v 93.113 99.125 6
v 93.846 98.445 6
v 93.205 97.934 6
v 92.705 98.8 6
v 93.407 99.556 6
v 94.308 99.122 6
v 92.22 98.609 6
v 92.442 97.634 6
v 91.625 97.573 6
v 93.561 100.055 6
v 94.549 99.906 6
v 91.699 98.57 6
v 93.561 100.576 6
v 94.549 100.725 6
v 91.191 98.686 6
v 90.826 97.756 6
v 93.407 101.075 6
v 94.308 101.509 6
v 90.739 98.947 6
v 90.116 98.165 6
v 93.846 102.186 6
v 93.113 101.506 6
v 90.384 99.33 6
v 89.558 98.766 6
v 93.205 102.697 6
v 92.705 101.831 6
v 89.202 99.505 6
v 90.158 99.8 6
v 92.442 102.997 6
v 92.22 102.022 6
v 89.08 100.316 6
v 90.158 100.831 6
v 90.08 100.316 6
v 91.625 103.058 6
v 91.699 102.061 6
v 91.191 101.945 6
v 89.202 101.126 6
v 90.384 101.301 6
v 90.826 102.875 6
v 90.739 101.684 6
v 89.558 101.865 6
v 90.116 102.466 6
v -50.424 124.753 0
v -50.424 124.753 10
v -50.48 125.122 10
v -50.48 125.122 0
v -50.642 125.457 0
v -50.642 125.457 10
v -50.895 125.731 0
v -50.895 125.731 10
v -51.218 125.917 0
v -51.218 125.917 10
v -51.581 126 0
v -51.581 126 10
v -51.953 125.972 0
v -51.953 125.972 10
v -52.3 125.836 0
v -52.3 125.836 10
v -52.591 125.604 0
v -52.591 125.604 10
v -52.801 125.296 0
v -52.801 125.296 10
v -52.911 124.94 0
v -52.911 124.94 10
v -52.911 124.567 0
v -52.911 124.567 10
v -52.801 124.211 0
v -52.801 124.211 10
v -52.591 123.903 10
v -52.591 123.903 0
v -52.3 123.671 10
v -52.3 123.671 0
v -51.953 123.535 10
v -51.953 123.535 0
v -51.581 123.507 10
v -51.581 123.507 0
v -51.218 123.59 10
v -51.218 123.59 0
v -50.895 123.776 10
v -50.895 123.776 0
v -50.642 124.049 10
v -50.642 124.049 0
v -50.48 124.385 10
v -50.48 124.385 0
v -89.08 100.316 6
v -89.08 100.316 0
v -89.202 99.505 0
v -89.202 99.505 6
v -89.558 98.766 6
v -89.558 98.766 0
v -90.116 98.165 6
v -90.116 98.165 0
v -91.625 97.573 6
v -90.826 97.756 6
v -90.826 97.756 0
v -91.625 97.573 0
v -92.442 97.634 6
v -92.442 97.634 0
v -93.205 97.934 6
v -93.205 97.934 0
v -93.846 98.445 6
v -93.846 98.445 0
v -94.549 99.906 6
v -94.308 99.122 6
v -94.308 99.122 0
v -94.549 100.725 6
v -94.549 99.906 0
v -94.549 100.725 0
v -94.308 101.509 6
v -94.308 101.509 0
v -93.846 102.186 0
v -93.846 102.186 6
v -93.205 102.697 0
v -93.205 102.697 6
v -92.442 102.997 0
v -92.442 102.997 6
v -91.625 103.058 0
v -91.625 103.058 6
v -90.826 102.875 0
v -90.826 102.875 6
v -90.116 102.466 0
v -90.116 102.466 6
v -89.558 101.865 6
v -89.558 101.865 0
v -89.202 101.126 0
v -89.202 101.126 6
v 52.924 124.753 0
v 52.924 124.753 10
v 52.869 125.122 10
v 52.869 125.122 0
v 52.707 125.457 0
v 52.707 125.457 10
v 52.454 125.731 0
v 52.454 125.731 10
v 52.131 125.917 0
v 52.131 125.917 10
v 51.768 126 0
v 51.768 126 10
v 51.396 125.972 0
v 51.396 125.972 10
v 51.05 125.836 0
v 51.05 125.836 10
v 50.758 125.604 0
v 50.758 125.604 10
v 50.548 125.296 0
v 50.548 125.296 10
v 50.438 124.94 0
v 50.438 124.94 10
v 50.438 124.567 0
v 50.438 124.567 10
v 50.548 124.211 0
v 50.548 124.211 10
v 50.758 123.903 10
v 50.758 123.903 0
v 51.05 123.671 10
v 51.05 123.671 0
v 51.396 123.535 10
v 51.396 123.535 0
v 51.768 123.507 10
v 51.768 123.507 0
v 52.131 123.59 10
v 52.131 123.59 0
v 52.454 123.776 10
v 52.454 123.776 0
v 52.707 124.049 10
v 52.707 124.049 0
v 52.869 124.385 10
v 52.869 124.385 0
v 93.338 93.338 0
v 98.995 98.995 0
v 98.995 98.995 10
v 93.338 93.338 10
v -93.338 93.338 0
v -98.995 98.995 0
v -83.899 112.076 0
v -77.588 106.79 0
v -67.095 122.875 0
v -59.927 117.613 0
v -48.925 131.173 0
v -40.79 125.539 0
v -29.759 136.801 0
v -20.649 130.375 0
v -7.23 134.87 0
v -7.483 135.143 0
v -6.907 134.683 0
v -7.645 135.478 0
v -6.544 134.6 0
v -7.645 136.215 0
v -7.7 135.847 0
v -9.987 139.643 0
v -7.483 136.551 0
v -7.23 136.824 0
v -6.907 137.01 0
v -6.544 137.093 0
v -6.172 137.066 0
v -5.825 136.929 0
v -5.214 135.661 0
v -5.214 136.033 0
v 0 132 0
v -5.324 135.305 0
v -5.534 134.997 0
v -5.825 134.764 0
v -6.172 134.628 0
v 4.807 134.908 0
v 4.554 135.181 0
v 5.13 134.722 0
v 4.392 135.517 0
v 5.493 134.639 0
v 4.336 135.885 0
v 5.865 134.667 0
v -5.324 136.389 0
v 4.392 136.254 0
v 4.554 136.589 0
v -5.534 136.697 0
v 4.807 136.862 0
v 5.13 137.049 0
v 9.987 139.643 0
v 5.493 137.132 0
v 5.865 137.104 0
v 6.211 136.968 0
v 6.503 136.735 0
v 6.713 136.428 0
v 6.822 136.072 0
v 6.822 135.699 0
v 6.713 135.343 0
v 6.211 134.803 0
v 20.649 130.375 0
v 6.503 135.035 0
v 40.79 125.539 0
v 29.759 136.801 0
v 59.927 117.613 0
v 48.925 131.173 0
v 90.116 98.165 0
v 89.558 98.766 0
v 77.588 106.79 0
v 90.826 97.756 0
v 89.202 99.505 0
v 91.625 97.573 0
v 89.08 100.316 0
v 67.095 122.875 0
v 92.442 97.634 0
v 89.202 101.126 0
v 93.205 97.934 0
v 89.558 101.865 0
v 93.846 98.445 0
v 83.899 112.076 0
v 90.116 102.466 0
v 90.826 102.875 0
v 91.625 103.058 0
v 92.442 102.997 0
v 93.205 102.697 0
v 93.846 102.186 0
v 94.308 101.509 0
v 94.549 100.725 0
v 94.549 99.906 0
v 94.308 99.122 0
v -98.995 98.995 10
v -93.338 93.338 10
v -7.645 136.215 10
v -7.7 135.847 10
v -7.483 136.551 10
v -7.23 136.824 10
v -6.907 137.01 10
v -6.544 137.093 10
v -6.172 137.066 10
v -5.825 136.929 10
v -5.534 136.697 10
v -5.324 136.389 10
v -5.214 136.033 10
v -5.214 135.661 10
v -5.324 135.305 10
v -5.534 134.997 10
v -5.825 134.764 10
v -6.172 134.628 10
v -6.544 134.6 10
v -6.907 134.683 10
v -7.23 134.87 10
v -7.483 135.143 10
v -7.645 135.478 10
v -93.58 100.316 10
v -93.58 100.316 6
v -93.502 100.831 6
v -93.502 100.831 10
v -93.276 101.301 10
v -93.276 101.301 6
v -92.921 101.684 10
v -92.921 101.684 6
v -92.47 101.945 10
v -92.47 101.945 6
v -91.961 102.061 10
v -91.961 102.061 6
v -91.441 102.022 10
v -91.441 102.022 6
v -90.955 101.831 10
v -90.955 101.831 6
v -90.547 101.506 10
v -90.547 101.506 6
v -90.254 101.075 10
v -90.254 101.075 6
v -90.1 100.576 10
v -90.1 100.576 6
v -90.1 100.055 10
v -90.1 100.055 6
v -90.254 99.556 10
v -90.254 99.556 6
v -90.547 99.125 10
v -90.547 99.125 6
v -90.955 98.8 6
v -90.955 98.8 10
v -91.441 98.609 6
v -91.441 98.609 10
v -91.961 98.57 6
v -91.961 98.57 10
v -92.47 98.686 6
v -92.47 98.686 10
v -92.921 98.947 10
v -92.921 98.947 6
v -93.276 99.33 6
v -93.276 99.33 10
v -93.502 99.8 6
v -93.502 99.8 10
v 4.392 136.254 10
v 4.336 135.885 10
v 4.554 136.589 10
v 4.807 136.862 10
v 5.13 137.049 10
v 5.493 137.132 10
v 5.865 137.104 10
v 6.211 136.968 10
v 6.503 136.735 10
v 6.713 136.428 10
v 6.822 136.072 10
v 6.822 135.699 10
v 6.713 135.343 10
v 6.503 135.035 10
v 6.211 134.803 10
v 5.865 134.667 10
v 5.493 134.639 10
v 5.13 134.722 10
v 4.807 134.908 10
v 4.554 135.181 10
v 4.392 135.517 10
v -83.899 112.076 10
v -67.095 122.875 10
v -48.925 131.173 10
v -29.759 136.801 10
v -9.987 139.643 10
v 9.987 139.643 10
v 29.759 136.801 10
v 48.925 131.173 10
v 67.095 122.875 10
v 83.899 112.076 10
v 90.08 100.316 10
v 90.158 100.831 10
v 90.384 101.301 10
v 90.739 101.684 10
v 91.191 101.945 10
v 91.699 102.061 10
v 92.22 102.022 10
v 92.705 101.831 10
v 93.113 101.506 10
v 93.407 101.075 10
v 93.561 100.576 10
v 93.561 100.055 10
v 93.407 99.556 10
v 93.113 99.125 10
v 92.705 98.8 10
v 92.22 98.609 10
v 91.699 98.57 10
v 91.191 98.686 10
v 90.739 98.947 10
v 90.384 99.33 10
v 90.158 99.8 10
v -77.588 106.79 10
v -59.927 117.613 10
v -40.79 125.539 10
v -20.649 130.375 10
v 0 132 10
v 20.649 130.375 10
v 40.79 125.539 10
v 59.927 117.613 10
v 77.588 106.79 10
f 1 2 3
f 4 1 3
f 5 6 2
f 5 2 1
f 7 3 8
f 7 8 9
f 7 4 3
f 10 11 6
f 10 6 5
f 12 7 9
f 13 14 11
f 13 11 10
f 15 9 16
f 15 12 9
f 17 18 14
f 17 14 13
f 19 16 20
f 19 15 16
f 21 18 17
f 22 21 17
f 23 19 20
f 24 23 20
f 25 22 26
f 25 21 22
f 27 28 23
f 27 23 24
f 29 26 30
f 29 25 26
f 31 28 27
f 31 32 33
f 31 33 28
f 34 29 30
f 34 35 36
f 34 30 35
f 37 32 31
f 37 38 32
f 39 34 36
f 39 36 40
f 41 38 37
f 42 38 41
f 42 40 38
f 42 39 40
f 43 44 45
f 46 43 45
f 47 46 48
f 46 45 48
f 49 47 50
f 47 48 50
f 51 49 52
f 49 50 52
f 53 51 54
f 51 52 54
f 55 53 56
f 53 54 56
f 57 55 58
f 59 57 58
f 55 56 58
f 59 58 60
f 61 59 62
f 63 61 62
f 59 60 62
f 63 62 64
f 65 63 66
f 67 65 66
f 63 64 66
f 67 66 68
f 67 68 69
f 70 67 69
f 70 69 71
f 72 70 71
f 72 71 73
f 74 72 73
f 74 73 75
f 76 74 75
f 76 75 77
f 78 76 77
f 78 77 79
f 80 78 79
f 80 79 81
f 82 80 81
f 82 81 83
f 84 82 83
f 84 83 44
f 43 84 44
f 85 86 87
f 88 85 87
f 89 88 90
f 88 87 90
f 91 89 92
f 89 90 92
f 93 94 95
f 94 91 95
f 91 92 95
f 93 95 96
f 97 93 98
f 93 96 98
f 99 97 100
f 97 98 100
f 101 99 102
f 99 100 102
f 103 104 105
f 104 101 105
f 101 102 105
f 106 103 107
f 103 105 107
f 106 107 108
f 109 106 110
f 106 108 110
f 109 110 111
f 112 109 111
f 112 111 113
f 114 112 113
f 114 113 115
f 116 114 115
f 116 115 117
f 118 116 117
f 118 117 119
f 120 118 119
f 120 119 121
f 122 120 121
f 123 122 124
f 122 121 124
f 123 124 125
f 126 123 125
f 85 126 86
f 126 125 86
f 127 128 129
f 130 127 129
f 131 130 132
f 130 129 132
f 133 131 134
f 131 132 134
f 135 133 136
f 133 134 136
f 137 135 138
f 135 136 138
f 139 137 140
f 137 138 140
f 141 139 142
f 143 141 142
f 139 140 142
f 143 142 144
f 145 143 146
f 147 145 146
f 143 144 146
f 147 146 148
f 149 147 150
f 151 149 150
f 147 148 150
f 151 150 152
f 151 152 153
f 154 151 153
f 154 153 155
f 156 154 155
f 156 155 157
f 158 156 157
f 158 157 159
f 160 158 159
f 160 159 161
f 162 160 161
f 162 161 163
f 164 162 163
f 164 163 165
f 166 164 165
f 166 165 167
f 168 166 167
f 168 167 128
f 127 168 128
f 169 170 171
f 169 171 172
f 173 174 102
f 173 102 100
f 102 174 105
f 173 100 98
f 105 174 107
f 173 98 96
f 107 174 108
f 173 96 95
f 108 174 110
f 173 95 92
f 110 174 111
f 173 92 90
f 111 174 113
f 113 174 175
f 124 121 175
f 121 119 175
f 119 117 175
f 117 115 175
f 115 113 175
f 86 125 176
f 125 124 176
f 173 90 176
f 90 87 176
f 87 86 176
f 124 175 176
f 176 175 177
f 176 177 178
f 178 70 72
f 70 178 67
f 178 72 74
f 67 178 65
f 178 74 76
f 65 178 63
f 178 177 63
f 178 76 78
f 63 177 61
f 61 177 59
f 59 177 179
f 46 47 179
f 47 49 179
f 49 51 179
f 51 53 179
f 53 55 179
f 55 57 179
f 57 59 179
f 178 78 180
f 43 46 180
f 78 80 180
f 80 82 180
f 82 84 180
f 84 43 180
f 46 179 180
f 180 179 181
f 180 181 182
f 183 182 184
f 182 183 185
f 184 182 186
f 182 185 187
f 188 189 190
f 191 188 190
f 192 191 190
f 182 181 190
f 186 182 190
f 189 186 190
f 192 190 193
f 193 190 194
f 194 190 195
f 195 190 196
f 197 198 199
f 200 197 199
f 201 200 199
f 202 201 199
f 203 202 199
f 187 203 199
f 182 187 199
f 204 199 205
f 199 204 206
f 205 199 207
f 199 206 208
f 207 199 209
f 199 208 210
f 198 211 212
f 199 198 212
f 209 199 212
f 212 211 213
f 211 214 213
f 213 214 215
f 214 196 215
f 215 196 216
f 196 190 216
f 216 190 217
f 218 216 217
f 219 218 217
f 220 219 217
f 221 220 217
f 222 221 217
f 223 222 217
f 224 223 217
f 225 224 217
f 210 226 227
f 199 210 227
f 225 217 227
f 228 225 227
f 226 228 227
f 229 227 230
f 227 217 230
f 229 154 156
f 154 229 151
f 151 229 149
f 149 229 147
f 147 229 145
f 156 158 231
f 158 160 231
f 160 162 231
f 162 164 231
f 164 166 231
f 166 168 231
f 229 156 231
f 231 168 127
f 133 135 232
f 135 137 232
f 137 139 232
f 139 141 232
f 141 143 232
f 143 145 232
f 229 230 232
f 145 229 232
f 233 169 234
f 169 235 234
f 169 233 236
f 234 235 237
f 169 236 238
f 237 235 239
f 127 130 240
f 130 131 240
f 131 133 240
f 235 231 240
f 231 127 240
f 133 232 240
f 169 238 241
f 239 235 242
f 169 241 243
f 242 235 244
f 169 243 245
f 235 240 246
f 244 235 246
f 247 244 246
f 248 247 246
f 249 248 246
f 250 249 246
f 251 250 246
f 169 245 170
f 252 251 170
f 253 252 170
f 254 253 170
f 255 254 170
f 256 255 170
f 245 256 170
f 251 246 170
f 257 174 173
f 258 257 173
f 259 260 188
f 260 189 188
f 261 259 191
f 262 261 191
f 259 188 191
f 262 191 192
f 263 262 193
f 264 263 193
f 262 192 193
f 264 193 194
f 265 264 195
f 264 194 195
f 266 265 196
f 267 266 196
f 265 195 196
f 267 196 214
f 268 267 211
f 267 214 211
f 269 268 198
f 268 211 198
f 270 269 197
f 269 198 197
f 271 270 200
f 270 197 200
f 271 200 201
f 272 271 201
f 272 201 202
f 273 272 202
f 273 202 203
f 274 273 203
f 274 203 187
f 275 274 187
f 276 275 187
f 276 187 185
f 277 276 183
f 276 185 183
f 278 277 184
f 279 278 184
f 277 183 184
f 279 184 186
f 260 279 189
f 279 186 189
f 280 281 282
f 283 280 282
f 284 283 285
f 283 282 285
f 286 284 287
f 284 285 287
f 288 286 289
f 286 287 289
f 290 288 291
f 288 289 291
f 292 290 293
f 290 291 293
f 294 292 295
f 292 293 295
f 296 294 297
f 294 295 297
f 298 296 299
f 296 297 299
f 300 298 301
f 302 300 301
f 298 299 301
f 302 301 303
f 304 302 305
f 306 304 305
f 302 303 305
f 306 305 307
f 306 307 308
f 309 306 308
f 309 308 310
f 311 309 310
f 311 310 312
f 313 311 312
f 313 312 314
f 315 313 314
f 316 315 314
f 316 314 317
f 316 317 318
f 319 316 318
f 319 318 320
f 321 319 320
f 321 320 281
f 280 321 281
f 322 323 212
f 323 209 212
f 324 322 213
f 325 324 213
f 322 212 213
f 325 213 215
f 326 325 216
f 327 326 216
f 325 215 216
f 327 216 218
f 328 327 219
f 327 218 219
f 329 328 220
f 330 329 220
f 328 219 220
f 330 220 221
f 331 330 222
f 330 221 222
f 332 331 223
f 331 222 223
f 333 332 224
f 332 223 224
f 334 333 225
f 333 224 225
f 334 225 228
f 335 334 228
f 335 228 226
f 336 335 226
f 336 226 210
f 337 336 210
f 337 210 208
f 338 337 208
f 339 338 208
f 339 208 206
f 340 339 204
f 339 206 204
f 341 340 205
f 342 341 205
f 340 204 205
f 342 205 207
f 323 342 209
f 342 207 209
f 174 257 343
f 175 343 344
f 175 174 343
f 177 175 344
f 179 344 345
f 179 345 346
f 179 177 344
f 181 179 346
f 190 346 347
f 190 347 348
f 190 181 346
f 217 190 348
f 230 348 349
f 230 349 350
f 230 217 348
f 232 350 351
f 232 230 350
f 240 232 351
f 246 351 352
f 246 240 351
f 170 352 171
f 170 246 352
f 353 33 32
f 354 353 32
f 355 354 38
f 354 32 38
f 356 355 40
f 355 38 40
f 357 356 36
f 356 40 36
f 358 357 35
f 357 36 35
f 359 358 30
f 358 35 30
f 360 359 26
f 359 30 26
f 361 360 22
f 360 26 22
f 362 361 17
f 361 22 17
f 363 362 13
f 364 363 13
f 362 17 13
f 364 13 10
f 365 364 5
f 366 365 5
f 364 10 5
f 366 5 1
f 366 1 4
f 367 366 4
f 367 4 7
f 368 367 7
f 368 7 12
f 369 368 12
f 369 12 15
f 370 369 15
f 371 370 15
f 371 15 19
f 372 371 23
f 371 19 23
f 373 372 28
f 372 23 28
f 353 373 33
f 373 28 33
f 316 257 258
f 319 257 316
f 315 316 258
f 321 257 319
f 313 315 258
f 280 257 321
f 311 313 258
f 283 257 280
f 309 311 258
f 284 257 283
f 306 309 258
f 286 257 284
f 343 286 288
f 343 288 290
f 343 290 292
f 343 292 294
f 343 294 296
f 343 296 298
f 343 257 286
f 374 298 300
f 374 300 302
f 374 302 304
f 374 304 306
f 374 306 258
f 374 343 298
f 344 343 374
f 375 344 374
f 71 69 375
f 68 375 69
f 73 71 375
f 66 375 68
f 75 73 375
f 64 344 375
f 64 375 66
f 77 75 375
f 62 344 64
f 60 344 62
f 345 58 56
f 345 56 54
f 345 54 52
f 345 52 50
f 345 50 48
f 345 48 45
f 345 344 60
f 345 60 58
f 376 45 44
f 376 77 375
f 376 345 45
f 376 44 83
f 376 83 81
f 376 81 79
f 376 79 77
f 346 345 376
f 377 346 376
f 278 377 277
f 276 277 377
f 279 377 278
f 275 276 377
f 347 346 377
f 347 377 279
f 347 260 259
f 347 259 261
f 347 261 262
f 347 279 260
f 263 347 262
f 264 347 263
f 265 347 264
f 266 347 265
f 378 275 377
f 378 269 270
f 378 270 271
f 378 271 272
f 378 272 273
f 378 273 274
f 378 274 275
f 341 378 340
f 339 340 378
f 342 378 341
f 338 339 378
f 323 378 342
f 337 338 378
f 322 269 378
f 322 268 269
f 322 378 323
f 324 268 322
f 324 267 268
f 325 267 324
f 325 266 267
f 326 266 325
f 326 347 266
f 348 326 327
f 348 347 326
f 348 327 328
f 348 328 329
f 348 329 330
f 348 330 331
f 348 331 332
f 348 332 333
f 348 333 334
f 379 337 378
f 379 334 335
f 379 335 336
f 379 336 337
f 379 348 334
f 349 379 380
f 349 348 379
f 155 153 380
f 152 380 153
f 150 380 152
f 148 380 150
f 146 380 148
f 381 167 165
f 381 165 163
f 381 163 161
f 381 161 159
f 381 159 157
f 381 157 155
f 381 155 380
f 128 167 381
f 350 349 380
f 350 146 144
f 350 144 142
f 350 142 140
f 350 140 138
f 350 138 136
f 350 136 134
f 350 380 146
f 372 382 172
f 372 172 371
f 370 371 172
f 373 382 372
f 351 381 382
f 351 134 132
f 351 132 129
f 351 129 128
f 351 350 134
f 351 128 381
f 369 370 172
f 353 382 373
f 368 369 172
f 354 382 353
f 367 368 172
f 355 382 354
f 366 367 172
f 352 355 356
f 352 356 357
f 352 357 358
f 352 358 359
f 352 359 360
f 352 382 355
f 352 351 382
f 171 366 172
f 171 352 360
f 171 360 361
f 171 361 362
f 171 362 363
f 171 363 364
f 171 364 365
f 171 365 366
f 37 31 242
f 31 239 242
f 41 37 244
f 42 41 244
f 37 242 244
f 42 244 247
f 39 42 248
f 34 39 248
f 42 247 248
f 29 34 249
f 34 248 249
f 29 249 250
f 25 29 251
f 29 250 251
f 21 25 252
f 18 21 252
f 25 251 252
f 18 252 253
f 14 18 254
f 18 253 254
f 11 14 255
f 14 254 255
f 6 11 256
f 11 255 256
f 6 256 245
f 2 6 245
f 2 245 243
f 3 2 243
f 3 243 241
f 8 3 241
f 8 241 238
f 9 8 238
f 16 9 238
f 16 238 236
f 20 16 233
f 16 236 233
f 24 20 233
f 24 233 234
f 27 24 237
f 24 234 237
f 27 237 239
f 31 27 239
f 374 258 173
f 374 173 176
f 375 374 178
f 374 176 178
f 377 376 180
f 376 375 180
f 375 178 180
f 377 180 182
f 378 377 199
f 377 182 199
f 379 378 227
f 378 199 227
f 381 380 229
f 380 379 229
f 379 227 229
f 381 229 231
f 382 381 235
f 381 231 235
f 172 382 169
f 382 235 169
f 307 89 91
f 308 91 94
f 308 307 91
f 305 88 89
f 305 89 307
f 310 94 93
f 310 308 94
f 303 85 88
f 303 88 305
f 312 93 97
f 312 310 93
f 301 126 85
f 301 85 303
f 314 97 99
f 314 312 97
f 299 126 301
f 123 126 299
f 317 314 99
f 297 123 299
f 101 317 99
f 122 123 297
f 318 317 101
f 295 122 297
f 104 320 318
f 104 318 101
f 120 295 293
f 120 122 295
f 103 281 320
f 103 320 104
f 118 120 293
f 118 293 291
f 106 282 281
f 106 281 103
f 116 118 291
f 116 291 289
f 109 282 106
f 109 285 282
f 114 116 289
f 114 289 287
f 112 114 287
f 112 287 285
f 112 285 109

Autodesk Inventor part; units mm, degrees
ref_plane "YZ Plane" through (0, 0, 0) normal (1, 0, 0) x (0, 1, 0)
ref_plane "XZ Plane" through (0, 0, 0) normal (0, 1, 0) x (-1, 0, 0)
ref_plane "XY Plane" through (0, 0, 0) normal (0, 0, 1) x (1, 0, 0)
sketch "草图1" plane through (0, 0, 0) normal (0, 0, 1) x (1, 0, 0)
  circle A0 centre (0, 0) radius 140
  circle A1 centre (0, 0) radius 132
  line L0 (0, 140) -> (0, -140)
  line L1 (140, 0) -> (-140, 0)
  line L2 (-98.9949, 98.9949) -> (98.9949, -98.9949)
  line L3 (98.9949, 98.9949) -> (-98.9949, -98.9949)
  point P0 (-93.3381, 93.3381)
  point P1 (93.3381, 93.3381)
  dimension "d0" = 280
  dimension "d1" = 8
  dimension "d2" = 90
  dimension "d5" = 45
extrude "拉伸1" add sketch "草图1" along normal blind 10 contours L3 A1 L0 A0 | L0 A1 L2 A0 picked at (81.3579, 110.3999) picked at (-77.3338, 113.2551)
sketch "草图2" plane through (0, 0, 0) normal (0, 0, -1) x (-1, 0, 0)
  circle A0 centre (0, 0) radius 136
  arc A1 (93.3381, 93.3381) -> (-93.3381, 93.3381) centre (0, 0) ccw projected
  arc A2 (98.9949, 98.9949) -> (-98.9949, 98.9949) centre (0, 0) ccw projected
  circle A3 centre (91.8302, 100.3155) radius 1.75
  line L0 (98.9949, 98.9949) -> (93.3381, 93.3381) projected
  line L1 (0, 140) -> (0, 106.7843)
  circle A4 centre (-91.8302, 100.3155) radius 1.75
  dimension "d9" = 4
  dimension "d11" = 3.5
  dimension "d12" = 6
extrude "拉伸2" cut sketch "草图2" against normal blind 29.25 contours A4 A0 | A0 A4 | A3 A0 | A0 A3
sketch "草图3" plane through (0, 0, 0) normal (0, 0, -1) x (-1, 0, 0)
  circle A0 centre (6.4504, 135.8469) radius 1.5
  circle A1 centre (-100.3405, 91.803) radius 1.5 projected
  circle A2 centre (-100.3405, 91.803) radius 1.5 projected
  circle A3 centre (-5.5864, 135.8852) radius 1.5 projected
  circle A4 centre (6.4504, 135.8469) radius 1.25
  circle A5 centre (-5.5864, 135.8852) radius 1.25
  point P0 (0, 0)
  dimension "d27" = 2.5
  dimension "d28" = 2.5
extrude "拉伸3" cut sketch "草图3" against normal blind 29.25 contours A4 | A5
sketch "草图4" plane through (0, 0, 10) normal (0, 0, 1) x (1, 0, 0)
  line L0 (0, 0) -> (-63.3975, 153.0551)
  line L1 (0, 0) -> (0, 175.6772)
  line L2 (0, 0) -> (-105.4105, 105.4105)
  line L3 (-98.9949, 98.9949) -> (-93.3381, 93.3381) projected
  circle A0 centre (0, 0) radius 135.032
  circle A1 centre (-51.6745, 124.7533) radius 1.5
  circle A2 centre (51.6745, 124.7533) radius 1.5
  circle A3 centre (-51.6745, 124.7533) radius 1.25
  circle A4 centre (51.6745, 124.7533) radius 1.25
  dimension "d23" = 270.064
  dimension "d21" = 22.5
  dimension "d22" = 22.5
  dimension "d24" = 3
  dimension "d33" = 2.5
  dimension "d34" = 2.5
extrude "拉伸4" cut sketch "草图4" against normal blind 10 contours A3 A0 L0 | L0 A0 A3 | A0 A3 L0 | L0 A3 A0 | A4 A0 | A0 A4
thread "螺纹1" size "M3x0.5" class "6H" standard "ANSI Metric M Profile" full length
thread "螺纹2" size "M3x0.5" class "6H" standard "ANSI Metric M Profile" full length
thread "螺纹3" size "M3x0.5" class "6H" standard "ANSI Metric M Profile" full length
thread "螺纹4" size "M3x0.5" class "6H" standard "ANSI Metric M Profile" full length
sketch "草图7" plane through (0, 0, 0) normal (0, 0, -1) x (-1, 0, 0)
  circle A0 centre (-91.8302, 100.3155) radius 1.75 projected
  circle A1 centre (-91.8302, 100.3155) radius 2.75
  point P0 (0, 0)
  dimension "d39" = 5.5
extrude "拉伸5" cut sketch "草图7" against normal blind 6 contours A0 | A1
mirror "镜像1" about plane through (0, 0, 0) normal (1, 0, 0) of "拉伸5"
properties part number "组合"
